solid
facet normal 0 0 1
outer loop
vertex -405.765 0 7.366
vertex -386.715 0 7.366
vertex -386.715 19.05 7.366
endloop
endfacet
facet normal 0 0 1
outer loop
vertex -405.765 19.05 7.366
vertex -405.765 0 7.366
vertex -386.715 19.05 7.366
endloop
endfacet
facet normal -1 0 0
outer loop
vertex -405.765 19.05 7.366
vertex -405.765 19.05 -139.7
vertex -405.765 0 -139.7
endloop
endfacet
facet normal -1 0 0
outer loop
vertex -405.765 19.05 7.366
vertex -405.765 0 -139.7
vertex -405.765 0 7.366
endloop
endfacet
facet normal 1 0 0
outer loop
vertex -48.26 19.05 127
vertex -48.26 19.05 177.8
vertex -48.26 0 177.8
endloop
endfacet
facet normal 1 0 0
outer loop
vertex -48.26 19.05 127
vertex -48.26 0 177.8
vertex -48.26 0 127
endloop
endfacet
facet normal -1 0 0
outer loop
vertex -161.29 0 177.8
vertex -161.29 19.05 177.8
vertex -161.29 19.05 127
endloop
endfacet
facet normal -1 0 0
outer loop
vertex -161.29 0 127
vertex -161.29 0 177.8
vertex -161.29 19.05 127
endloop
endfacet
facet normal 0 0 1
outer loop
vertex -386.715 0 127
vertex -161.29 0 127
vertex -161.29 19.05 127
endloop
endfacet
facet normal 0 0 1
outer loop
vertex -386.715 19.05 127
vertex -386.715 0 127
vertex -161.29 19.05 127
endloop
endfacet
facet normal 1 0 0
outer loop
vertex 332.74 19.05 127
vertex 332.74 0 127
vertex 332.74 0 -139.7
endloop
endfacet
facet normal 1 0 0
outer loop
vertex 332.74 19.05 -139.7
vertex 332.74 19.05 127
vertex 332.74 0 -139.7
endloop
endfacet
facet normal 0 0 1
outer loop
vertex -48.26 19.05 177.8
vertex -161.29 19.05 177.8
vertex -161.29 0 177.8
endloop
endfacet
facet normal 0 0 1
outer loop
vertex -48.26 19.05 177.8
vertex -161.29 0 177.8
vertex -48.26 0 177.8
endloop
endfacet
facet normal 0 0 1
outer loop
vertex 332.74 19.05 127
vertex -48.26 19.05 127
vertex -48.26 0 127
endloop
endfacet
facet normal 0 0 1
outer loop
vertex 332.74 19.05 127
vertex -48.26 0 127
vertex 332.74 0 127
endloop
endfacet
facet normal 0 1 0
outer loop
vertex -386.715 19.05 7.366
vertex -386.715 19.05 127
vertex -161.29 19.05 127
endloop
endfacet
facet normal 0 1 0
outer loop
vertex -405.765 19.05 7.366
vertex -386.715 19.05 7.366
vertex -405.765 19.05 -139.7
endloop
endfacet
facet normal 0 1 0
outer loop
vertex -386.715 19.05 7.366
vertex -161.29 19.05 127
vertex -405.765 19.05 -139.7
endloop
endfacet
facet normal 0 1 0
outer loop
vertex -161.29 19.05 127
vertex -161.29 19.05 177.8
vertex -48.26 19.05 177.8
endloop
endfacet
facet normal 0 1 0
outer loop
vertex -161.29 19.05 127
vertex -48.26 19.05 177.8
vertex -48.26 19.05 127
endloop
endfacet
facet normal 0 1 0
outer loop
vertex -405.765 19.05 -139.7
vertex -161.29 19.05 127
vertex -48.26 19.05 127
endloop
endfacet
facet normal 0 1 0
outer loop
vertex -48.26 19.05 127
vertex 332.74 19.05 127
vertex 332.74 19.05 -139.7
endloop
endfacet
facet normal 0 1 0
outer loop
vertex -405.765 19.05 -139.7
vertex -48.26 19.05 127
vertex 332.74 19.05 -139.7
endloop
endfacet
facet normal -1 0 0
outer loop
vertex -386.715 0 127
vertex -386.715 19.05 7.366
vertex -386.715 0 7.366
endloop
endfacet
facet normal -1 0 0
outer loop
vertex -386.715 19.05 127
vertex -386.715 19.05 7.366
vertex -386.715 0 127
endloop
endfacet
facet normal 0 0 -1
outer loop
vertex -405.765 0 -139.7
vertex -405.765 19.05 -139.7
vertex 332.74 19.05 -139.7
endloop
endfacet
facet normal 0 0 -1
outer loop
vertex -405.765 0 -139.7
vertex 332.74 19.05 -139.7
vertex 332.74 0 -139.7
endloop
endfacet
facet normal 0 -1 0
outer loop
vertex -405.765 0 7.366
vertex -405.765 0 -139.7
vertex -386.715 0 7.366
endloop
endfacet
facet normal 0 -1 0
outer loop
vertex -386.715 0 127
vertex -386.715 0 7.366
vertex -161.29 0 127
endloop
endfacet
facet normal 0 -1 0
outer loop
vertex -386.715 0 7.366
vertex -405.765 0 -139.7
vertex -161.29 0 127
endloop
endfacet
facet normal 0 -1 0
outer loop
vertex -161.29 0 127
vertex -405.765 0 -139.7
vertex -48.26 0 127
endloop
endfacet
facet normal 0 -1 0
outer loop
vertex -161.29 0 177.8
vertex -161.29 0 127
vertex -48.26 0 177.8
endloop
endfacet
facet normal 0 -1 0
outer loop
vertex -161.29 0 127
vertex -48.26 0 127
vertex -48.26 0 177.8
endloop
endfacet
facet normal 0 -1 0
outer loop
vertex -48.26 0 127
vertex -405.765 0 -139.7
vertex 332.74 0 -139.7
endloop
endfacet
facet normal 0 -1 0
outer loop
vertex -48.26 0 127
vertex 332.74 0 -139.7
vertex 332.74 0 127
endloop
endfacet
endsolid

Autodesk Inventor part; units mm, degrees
ref_plane "YZ Plane" through (0, 0, 0) normal (1, 0, 0) x (0, 1, 0)
ref_plane "XZ Plane" through (0, 0, 0) normal (0, 1, 0) x (-1, 0, 0)
ref_plane "XY Plane" through (0, 0, 0) normal (0, 0, 1) x (1, 0, 0)
sketch "Sketch1" plane through (0, 0, 0) normal (0, 1, 0) x (-1, 0, 0)
  line L0 (332.74, 139.7) -> (-332.74, 139.7)
  line L1 (-332.74, 139.7) -> (-332.74, -139.7)
  line L2 (-332.74, -139.7) -> (332.74, -139.7)
  line L3 (332.74, -139.7) -> (332.74, 139.7)
  line L4 (332.74, 139.7) -> (-332.74, -139.7) construction
  line L5 (-332.74, 139.7) -> (332.74, -139.7) construction
  point P0 (0, 0)
  dimension "d0" = 665.48
  dimension "d1" = 279.4
extrude "Extrusion1" add sketch "Sketch1" along normal blind 19.05
sketch "Sketch2" plane through (0, 19.05, 0) normal (0, 1, 0) x (1, 0, 0)
  circle A0 centre (73.2058, 76.2) radius 50.8
  circle A1 centre (-104.14, -139.7) radius 38.1
  line L0 (-332.74, -139.7) -> (332.74, -139.7) projected
  line L1 (332.74, -139.7) -> (332.74, 139.7) projected
  line L2 (332.74, 139.7) -> (-332.74, 139.7) projected
  line L3 (-332.74, 139.7) -> (-332.74, -139.7) projected
  circle A2 centre (-104.14, -139.7) radius 12.7
  circle A3 centre (73.2058, 76.2) radius 14.859
  point P0 (0, 0)
  dimension "d12" = 101.6
  dimension "d13" = 76.2
  dimension "d27" = 25.4
  dimension "d28" = 29.718
sketch "Sketch4" plane through (-332.74, 0, 139.7) normal (0, 0, 1) x (1, 0, 0)
  line L0 (0, 0) -> (665.48, 0) projected
  line L1 (665.48, 0) -> (665.48, 19.05) projected
  line L2 (0, 19.05) -> (665.48, 19.05) projected
  line L3 (0, 0) -> (0, 19.05) projected
  point P0 (332.74, 0)
extrude "Extrusion3" add sketch "Sketch4" along normal blind 38.1
sketch "Sketch5" plane through (0, 19.05, 0) normal (0, 1, 0) x (1, 0, 0)
  line L0 (-332.74, -177.8) -> (-161.29, -177.8)
  line L1 (-161.29, -177.8) -> (-161.29, -127)
  line L2 (-161.29, -127) -> (-332.74, -127)
  line L3 (-332.74, -127) -> (-332.74, -177.8)
  line L4 (332.74, -177.8) -> (-48.2601, -177.8)
  line L5 (-48.2601, -177.8) -> (-48.2601, -127)
  line L6 (-48.2601, -127) -> (332.74, -127)
  line L7 (332.74, -127) -> (332.74, -177.8)
  line L8 (332.74, -177.8) -> (-48.2601, -177.8)
  line L9 (-48.2601, -177.8) -> (-48.2601, -127)
  line L10 (-48.2601, -127) -> (332.74, -127)
  line L11 (332.74, -127) -> (332.74, -177.8)
  point P0 (0, 0)
  dimension "d18" = 171.45
  dimension "d19" = 50.8
extrude "Extrusion5" cut sketch "Sketch5" against normal blind 50.8
sketch "Sketch6" plane through (-332.74, 0, -139.7) normal (-1, 0, 0) x (0, 0, 1)
  line L0 (266.7, 0) -> (266.7, 19.05) projected
  line L1 (0, 19.05) -> (266.7, 19.05) projected
  line L2 (0, 0) -> (0, 19.05) projected
  line L3 (0, 0) -> (266.7, 0) projected
  point P0 (139.7, 0)
extrude "Extrusion6" add sketch "Sketch6" along normal blind 53.975
sketch "Sketch7" plane through (-386.715, 0, -139.7) normal (-1, 0, 0) x (0, 0, 1)
  line L0 (266.7, 19.05) -> (0, 19.05) projected
  line L1 (266.7, 19.05) -> (147.066, 19.05)
  line L2 (0, 0) -> (147.066, 0)
  line L3 (147.066, 0) -> (147.066, 19.05)
  line L4 (147.066, 19.05) -> (0, 19.05)
  line L5 (0, 19.05) -> (0, 0)
  point P0 (139.7, 0)
  dimension "d24" = 119.634
extrude "Extrusion7" add sketch "Sketch7" along normal blind 19.05
properties part number "Robot Shooter Support Wall" material "Wood (Birch)"
